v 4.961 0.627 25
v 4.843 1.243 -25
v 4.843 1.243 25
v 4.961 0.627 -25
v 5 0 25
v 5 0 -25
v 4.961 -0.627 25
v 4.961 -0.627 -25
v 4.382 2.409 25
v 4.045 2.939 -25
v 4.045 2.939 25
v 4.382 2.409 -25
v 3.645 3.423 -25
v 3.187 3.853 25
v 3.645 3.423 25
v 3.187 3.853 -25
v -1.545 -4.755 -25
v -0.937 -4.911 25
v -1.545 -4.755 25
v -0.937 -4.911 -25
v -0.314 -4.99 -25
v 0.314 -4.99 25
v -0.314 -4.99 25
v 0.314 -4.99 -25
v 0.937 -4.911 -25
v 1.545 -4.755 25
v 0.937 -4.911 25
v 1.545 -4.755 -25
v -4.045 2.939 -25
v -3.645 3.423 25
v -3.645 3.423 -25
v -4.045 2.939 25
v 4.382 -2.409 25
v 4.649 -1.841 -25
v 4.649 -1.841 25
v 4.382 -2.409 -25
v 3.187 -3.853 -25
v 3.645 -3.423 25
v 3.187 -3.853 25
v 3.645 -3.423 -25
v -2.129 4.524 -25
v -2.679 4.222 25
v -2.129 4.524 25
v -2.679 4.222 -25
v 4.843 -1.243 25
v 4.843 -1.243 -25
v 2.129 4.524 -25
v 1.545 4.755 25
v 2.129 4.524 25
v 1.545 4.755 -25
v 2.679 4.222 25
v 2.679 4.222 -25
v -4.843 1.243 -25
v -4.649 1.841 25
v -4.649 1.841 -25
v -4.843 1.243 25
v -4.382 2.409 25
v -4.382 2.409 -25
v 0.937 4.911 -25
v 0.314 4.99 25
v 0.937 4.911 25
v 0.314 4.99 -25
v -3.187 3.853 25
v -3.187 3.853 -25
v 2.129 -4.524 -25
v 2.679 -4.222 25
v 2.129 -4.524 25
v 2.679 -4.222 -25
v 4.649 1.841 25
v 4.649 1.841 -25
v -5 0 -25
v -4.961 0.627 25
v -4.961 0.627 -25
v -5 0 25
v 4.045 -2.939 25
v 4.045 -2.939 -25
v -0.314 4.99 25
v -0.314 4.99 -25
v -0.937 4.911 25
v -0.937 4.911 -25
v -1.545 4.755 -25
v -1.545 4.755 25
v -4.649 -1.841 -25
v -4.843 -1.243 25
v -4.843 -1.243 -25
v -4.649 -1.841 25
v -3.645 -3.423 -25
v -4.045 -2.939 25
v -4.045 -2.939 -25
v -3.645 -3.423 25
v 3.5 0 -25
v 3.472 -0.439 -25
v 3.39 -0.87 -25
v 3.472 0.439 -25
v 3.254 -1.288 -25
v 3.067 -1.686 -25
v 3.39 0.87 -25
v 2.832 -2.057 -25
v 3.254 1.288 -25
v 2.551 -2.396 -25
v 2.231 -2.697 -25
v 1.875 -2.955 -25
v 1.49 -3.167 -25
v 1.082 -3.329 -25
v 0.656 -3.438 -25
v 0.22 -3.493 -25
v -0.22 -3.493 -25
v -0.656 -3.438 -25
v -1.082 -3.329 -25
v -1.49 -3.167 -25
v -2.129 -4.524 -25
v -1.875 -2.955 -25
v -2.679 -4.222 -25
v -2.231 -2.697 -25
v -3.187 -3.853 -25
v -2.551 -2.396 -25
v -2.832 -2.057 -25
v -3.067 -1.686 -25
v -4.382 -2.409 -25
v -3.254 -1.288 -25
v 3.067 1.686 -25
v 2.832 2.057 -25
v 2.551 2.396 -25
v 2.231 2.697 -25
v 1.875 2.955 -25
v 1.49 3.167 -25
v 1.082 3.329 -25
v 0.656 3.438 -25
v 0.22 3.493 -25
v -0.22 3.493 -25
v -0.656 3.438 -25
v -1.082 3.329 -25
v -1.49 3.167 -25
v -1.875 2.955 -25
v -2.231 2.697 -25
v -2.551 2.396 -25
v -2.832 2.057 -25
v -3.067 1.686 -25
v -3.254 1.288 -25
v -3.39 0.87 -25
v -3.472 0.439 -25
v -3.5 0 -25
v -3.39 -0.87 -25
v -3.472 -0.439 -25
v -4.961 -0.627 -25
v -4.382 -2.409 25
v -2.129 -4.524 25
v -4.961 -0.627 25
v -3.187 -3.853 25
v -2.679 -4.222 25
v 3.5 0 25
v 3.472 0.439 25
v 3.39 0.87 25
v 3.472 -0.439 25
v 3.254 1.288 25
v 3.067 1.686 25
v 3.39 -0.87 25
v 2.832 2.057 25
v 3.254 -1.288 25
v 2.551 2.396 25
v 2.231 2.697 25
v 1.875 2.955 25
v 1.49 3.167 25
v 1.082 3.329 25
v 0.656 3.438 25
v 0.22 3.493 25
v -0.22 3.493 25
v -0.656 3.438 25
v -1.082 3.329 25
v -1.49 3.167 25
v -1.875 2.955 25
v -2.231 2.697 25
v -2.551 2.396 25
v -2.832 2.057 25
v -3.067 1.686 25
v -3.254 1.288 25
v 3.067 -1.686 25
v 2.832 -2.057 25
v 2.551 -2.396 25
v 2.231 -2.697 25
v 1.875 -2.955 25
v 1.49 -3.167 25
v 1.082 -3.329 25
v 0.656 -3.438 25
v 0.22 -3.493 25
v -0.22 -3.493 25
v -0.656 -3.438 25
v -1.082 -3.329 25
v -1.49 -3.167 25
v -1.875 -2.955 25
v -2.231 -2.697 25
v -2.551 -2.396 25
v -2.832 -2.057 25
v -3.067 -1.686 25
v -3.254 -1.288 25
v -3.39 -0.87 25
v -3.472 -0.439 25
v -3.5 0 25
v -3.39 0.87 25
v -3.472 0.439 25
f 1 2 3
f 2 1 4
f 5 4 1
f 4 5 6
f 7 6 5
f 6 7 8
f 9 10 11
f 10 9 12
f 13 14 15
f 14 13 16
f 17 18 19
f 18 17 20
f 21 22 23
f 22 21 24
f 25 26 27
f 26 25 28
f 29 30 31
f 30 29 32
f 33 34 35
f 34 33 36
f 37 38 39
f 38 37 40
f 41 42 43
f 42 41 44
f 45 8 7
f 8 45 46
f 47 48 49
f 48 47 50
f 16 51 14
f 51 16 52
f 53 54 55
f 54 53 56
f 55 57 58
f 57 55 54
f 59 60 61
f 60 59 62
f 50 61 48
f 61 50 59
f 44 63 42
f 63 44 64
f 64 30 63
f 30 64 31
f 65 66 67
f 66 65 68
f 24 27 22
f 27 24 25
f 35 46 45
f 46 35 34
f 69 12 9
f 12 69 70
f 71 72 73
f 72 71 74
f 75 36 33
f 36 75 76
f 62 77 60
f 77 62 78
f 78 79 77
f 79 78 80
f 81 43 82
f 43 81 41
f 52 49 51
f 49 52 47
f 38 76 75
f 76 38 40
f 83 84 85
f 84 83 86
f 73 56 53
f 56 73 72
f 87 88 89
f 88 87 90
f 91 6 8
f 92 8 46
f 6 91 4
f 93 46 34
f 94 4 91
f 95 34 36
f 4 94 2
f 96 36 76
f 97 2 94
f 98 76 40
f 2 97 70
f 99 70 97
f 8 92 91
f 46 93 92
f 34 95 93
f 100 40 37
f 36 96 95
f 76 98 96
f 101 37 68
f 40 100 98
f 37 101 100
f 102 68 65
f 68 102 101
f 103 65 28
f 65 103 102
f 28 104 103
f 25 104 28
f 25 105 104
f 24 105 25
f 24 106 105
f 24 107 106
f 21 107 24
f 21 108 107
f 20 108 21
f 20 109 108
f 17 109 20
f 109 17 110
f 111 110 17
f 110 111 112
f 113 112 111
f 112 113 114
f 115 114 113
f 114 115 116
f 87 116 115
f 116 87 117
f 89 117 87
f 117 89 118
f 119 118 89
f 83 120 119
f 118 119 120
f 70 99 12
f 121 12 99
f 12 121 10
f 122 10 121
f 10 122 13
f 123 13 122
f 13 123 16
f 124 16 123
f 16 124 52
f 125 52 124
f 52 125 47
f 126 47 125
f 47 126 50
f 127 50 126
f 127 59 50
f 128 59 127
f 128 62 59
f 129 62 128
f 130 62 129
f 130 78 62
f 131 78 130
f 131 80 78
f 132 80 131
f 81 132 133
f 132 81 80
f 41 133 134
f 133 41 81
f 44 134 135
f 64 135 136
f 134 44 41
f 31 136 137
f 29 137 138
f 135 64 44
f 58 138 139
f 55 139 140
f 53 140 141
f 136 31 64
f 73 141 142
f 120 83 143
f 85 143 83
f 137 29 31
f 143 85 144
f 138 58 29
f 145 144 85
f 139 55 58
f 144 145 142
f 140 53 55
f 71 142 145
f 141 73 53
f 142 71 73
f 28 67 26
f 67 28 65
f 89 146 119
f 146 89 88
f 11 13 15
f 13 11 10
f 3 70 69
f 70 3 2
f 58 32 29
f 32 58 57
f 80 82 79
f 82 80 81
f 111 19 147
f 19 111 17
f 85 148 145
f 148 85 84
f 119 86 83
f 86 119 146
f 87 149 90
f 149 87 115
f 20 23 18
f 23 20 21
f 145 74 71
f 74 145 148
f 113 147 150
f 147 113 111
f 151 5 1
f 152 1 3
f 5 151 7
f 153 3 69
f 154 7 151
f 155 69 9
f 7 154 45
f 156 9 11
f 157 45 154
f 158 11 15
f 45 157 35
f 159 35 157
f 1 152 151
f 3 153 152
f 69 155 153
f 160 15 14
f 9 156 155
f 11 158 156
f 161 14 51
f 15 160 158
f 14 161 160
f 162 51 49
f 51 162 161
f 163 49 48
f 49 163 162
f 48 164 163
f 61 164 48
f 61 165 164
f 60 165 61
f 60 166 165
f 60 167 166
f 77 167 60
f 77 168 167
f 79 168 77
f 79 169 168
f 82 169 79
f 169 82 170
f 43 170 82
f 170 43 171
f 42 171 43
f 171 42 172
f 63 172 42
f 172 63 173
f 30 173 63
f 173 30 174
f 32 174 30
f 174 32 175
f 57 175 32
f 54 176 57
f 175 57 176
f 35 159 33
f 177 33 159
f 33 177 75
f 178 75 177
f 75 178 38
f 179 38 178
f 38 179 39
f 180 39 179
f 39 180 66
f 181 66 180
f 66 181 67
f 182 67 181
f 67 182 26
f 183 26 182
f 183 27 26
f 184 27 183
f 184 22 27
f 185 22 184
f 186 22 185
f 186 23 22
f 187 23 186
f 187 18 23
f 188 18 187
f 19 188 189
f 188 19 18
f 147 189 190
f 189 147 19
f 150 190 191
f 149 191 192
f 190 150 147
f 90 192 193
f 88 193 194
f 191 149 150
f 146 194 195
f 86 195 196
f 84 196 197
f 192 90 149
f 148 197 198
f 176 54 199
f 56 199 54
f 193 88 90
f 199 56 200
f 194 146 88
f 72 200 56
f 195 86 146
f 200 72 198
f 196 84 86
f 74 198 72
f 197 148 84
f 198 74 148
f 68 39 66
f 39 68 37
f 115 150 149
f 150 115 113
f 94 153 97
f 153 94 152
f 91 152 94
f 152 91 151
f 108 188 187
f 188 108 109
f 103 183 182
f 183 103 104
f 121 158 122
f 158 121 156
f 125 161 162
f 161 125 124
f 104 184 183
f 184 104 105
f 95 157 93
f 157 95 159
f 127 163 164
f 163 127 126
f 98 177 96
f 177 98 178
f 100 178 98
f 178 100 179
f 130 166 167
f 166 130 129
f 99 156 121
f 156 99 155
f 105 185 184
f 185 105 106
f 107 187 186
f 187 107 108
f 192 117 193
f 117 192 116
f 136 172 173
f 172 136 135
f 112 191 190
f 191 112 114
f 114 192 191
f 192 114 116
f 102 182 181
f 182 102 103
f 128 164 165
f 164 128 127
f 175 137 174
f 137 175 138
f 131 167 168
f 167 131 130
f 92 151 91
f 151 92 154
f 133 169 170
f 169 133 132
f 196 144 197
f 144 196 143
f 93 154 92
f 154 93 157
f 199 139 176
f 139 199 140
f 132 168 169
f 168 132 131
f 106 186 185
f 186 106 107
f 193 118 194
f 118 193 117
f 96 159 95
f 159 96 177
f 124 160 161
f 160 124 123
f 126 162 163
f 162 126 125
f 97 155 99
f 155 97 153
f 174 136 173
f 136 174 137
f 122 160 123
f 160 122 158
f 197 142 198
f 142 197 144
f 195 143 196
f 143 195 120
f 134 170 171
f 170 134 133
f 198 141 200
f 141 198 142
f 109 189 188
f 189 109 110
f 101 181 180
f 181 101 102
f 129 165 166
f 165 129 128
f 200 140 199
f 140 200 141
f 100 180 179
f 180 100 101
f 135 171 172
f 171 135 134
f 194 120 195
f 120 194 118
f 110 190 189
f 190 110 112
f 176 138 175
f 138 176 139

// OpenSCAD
$fn = 50;


difference() {
	union() {
		translate(v = [0, 0, -25.0000000000]) {
			cylinder(h = 50, r = 5.0000000000);
		}
	}
	union() {
		translate(v = [0, 0, -100.0000000000]) {
			cylinder(h = 200, r = 3.5000000000);
		}
	}
}
